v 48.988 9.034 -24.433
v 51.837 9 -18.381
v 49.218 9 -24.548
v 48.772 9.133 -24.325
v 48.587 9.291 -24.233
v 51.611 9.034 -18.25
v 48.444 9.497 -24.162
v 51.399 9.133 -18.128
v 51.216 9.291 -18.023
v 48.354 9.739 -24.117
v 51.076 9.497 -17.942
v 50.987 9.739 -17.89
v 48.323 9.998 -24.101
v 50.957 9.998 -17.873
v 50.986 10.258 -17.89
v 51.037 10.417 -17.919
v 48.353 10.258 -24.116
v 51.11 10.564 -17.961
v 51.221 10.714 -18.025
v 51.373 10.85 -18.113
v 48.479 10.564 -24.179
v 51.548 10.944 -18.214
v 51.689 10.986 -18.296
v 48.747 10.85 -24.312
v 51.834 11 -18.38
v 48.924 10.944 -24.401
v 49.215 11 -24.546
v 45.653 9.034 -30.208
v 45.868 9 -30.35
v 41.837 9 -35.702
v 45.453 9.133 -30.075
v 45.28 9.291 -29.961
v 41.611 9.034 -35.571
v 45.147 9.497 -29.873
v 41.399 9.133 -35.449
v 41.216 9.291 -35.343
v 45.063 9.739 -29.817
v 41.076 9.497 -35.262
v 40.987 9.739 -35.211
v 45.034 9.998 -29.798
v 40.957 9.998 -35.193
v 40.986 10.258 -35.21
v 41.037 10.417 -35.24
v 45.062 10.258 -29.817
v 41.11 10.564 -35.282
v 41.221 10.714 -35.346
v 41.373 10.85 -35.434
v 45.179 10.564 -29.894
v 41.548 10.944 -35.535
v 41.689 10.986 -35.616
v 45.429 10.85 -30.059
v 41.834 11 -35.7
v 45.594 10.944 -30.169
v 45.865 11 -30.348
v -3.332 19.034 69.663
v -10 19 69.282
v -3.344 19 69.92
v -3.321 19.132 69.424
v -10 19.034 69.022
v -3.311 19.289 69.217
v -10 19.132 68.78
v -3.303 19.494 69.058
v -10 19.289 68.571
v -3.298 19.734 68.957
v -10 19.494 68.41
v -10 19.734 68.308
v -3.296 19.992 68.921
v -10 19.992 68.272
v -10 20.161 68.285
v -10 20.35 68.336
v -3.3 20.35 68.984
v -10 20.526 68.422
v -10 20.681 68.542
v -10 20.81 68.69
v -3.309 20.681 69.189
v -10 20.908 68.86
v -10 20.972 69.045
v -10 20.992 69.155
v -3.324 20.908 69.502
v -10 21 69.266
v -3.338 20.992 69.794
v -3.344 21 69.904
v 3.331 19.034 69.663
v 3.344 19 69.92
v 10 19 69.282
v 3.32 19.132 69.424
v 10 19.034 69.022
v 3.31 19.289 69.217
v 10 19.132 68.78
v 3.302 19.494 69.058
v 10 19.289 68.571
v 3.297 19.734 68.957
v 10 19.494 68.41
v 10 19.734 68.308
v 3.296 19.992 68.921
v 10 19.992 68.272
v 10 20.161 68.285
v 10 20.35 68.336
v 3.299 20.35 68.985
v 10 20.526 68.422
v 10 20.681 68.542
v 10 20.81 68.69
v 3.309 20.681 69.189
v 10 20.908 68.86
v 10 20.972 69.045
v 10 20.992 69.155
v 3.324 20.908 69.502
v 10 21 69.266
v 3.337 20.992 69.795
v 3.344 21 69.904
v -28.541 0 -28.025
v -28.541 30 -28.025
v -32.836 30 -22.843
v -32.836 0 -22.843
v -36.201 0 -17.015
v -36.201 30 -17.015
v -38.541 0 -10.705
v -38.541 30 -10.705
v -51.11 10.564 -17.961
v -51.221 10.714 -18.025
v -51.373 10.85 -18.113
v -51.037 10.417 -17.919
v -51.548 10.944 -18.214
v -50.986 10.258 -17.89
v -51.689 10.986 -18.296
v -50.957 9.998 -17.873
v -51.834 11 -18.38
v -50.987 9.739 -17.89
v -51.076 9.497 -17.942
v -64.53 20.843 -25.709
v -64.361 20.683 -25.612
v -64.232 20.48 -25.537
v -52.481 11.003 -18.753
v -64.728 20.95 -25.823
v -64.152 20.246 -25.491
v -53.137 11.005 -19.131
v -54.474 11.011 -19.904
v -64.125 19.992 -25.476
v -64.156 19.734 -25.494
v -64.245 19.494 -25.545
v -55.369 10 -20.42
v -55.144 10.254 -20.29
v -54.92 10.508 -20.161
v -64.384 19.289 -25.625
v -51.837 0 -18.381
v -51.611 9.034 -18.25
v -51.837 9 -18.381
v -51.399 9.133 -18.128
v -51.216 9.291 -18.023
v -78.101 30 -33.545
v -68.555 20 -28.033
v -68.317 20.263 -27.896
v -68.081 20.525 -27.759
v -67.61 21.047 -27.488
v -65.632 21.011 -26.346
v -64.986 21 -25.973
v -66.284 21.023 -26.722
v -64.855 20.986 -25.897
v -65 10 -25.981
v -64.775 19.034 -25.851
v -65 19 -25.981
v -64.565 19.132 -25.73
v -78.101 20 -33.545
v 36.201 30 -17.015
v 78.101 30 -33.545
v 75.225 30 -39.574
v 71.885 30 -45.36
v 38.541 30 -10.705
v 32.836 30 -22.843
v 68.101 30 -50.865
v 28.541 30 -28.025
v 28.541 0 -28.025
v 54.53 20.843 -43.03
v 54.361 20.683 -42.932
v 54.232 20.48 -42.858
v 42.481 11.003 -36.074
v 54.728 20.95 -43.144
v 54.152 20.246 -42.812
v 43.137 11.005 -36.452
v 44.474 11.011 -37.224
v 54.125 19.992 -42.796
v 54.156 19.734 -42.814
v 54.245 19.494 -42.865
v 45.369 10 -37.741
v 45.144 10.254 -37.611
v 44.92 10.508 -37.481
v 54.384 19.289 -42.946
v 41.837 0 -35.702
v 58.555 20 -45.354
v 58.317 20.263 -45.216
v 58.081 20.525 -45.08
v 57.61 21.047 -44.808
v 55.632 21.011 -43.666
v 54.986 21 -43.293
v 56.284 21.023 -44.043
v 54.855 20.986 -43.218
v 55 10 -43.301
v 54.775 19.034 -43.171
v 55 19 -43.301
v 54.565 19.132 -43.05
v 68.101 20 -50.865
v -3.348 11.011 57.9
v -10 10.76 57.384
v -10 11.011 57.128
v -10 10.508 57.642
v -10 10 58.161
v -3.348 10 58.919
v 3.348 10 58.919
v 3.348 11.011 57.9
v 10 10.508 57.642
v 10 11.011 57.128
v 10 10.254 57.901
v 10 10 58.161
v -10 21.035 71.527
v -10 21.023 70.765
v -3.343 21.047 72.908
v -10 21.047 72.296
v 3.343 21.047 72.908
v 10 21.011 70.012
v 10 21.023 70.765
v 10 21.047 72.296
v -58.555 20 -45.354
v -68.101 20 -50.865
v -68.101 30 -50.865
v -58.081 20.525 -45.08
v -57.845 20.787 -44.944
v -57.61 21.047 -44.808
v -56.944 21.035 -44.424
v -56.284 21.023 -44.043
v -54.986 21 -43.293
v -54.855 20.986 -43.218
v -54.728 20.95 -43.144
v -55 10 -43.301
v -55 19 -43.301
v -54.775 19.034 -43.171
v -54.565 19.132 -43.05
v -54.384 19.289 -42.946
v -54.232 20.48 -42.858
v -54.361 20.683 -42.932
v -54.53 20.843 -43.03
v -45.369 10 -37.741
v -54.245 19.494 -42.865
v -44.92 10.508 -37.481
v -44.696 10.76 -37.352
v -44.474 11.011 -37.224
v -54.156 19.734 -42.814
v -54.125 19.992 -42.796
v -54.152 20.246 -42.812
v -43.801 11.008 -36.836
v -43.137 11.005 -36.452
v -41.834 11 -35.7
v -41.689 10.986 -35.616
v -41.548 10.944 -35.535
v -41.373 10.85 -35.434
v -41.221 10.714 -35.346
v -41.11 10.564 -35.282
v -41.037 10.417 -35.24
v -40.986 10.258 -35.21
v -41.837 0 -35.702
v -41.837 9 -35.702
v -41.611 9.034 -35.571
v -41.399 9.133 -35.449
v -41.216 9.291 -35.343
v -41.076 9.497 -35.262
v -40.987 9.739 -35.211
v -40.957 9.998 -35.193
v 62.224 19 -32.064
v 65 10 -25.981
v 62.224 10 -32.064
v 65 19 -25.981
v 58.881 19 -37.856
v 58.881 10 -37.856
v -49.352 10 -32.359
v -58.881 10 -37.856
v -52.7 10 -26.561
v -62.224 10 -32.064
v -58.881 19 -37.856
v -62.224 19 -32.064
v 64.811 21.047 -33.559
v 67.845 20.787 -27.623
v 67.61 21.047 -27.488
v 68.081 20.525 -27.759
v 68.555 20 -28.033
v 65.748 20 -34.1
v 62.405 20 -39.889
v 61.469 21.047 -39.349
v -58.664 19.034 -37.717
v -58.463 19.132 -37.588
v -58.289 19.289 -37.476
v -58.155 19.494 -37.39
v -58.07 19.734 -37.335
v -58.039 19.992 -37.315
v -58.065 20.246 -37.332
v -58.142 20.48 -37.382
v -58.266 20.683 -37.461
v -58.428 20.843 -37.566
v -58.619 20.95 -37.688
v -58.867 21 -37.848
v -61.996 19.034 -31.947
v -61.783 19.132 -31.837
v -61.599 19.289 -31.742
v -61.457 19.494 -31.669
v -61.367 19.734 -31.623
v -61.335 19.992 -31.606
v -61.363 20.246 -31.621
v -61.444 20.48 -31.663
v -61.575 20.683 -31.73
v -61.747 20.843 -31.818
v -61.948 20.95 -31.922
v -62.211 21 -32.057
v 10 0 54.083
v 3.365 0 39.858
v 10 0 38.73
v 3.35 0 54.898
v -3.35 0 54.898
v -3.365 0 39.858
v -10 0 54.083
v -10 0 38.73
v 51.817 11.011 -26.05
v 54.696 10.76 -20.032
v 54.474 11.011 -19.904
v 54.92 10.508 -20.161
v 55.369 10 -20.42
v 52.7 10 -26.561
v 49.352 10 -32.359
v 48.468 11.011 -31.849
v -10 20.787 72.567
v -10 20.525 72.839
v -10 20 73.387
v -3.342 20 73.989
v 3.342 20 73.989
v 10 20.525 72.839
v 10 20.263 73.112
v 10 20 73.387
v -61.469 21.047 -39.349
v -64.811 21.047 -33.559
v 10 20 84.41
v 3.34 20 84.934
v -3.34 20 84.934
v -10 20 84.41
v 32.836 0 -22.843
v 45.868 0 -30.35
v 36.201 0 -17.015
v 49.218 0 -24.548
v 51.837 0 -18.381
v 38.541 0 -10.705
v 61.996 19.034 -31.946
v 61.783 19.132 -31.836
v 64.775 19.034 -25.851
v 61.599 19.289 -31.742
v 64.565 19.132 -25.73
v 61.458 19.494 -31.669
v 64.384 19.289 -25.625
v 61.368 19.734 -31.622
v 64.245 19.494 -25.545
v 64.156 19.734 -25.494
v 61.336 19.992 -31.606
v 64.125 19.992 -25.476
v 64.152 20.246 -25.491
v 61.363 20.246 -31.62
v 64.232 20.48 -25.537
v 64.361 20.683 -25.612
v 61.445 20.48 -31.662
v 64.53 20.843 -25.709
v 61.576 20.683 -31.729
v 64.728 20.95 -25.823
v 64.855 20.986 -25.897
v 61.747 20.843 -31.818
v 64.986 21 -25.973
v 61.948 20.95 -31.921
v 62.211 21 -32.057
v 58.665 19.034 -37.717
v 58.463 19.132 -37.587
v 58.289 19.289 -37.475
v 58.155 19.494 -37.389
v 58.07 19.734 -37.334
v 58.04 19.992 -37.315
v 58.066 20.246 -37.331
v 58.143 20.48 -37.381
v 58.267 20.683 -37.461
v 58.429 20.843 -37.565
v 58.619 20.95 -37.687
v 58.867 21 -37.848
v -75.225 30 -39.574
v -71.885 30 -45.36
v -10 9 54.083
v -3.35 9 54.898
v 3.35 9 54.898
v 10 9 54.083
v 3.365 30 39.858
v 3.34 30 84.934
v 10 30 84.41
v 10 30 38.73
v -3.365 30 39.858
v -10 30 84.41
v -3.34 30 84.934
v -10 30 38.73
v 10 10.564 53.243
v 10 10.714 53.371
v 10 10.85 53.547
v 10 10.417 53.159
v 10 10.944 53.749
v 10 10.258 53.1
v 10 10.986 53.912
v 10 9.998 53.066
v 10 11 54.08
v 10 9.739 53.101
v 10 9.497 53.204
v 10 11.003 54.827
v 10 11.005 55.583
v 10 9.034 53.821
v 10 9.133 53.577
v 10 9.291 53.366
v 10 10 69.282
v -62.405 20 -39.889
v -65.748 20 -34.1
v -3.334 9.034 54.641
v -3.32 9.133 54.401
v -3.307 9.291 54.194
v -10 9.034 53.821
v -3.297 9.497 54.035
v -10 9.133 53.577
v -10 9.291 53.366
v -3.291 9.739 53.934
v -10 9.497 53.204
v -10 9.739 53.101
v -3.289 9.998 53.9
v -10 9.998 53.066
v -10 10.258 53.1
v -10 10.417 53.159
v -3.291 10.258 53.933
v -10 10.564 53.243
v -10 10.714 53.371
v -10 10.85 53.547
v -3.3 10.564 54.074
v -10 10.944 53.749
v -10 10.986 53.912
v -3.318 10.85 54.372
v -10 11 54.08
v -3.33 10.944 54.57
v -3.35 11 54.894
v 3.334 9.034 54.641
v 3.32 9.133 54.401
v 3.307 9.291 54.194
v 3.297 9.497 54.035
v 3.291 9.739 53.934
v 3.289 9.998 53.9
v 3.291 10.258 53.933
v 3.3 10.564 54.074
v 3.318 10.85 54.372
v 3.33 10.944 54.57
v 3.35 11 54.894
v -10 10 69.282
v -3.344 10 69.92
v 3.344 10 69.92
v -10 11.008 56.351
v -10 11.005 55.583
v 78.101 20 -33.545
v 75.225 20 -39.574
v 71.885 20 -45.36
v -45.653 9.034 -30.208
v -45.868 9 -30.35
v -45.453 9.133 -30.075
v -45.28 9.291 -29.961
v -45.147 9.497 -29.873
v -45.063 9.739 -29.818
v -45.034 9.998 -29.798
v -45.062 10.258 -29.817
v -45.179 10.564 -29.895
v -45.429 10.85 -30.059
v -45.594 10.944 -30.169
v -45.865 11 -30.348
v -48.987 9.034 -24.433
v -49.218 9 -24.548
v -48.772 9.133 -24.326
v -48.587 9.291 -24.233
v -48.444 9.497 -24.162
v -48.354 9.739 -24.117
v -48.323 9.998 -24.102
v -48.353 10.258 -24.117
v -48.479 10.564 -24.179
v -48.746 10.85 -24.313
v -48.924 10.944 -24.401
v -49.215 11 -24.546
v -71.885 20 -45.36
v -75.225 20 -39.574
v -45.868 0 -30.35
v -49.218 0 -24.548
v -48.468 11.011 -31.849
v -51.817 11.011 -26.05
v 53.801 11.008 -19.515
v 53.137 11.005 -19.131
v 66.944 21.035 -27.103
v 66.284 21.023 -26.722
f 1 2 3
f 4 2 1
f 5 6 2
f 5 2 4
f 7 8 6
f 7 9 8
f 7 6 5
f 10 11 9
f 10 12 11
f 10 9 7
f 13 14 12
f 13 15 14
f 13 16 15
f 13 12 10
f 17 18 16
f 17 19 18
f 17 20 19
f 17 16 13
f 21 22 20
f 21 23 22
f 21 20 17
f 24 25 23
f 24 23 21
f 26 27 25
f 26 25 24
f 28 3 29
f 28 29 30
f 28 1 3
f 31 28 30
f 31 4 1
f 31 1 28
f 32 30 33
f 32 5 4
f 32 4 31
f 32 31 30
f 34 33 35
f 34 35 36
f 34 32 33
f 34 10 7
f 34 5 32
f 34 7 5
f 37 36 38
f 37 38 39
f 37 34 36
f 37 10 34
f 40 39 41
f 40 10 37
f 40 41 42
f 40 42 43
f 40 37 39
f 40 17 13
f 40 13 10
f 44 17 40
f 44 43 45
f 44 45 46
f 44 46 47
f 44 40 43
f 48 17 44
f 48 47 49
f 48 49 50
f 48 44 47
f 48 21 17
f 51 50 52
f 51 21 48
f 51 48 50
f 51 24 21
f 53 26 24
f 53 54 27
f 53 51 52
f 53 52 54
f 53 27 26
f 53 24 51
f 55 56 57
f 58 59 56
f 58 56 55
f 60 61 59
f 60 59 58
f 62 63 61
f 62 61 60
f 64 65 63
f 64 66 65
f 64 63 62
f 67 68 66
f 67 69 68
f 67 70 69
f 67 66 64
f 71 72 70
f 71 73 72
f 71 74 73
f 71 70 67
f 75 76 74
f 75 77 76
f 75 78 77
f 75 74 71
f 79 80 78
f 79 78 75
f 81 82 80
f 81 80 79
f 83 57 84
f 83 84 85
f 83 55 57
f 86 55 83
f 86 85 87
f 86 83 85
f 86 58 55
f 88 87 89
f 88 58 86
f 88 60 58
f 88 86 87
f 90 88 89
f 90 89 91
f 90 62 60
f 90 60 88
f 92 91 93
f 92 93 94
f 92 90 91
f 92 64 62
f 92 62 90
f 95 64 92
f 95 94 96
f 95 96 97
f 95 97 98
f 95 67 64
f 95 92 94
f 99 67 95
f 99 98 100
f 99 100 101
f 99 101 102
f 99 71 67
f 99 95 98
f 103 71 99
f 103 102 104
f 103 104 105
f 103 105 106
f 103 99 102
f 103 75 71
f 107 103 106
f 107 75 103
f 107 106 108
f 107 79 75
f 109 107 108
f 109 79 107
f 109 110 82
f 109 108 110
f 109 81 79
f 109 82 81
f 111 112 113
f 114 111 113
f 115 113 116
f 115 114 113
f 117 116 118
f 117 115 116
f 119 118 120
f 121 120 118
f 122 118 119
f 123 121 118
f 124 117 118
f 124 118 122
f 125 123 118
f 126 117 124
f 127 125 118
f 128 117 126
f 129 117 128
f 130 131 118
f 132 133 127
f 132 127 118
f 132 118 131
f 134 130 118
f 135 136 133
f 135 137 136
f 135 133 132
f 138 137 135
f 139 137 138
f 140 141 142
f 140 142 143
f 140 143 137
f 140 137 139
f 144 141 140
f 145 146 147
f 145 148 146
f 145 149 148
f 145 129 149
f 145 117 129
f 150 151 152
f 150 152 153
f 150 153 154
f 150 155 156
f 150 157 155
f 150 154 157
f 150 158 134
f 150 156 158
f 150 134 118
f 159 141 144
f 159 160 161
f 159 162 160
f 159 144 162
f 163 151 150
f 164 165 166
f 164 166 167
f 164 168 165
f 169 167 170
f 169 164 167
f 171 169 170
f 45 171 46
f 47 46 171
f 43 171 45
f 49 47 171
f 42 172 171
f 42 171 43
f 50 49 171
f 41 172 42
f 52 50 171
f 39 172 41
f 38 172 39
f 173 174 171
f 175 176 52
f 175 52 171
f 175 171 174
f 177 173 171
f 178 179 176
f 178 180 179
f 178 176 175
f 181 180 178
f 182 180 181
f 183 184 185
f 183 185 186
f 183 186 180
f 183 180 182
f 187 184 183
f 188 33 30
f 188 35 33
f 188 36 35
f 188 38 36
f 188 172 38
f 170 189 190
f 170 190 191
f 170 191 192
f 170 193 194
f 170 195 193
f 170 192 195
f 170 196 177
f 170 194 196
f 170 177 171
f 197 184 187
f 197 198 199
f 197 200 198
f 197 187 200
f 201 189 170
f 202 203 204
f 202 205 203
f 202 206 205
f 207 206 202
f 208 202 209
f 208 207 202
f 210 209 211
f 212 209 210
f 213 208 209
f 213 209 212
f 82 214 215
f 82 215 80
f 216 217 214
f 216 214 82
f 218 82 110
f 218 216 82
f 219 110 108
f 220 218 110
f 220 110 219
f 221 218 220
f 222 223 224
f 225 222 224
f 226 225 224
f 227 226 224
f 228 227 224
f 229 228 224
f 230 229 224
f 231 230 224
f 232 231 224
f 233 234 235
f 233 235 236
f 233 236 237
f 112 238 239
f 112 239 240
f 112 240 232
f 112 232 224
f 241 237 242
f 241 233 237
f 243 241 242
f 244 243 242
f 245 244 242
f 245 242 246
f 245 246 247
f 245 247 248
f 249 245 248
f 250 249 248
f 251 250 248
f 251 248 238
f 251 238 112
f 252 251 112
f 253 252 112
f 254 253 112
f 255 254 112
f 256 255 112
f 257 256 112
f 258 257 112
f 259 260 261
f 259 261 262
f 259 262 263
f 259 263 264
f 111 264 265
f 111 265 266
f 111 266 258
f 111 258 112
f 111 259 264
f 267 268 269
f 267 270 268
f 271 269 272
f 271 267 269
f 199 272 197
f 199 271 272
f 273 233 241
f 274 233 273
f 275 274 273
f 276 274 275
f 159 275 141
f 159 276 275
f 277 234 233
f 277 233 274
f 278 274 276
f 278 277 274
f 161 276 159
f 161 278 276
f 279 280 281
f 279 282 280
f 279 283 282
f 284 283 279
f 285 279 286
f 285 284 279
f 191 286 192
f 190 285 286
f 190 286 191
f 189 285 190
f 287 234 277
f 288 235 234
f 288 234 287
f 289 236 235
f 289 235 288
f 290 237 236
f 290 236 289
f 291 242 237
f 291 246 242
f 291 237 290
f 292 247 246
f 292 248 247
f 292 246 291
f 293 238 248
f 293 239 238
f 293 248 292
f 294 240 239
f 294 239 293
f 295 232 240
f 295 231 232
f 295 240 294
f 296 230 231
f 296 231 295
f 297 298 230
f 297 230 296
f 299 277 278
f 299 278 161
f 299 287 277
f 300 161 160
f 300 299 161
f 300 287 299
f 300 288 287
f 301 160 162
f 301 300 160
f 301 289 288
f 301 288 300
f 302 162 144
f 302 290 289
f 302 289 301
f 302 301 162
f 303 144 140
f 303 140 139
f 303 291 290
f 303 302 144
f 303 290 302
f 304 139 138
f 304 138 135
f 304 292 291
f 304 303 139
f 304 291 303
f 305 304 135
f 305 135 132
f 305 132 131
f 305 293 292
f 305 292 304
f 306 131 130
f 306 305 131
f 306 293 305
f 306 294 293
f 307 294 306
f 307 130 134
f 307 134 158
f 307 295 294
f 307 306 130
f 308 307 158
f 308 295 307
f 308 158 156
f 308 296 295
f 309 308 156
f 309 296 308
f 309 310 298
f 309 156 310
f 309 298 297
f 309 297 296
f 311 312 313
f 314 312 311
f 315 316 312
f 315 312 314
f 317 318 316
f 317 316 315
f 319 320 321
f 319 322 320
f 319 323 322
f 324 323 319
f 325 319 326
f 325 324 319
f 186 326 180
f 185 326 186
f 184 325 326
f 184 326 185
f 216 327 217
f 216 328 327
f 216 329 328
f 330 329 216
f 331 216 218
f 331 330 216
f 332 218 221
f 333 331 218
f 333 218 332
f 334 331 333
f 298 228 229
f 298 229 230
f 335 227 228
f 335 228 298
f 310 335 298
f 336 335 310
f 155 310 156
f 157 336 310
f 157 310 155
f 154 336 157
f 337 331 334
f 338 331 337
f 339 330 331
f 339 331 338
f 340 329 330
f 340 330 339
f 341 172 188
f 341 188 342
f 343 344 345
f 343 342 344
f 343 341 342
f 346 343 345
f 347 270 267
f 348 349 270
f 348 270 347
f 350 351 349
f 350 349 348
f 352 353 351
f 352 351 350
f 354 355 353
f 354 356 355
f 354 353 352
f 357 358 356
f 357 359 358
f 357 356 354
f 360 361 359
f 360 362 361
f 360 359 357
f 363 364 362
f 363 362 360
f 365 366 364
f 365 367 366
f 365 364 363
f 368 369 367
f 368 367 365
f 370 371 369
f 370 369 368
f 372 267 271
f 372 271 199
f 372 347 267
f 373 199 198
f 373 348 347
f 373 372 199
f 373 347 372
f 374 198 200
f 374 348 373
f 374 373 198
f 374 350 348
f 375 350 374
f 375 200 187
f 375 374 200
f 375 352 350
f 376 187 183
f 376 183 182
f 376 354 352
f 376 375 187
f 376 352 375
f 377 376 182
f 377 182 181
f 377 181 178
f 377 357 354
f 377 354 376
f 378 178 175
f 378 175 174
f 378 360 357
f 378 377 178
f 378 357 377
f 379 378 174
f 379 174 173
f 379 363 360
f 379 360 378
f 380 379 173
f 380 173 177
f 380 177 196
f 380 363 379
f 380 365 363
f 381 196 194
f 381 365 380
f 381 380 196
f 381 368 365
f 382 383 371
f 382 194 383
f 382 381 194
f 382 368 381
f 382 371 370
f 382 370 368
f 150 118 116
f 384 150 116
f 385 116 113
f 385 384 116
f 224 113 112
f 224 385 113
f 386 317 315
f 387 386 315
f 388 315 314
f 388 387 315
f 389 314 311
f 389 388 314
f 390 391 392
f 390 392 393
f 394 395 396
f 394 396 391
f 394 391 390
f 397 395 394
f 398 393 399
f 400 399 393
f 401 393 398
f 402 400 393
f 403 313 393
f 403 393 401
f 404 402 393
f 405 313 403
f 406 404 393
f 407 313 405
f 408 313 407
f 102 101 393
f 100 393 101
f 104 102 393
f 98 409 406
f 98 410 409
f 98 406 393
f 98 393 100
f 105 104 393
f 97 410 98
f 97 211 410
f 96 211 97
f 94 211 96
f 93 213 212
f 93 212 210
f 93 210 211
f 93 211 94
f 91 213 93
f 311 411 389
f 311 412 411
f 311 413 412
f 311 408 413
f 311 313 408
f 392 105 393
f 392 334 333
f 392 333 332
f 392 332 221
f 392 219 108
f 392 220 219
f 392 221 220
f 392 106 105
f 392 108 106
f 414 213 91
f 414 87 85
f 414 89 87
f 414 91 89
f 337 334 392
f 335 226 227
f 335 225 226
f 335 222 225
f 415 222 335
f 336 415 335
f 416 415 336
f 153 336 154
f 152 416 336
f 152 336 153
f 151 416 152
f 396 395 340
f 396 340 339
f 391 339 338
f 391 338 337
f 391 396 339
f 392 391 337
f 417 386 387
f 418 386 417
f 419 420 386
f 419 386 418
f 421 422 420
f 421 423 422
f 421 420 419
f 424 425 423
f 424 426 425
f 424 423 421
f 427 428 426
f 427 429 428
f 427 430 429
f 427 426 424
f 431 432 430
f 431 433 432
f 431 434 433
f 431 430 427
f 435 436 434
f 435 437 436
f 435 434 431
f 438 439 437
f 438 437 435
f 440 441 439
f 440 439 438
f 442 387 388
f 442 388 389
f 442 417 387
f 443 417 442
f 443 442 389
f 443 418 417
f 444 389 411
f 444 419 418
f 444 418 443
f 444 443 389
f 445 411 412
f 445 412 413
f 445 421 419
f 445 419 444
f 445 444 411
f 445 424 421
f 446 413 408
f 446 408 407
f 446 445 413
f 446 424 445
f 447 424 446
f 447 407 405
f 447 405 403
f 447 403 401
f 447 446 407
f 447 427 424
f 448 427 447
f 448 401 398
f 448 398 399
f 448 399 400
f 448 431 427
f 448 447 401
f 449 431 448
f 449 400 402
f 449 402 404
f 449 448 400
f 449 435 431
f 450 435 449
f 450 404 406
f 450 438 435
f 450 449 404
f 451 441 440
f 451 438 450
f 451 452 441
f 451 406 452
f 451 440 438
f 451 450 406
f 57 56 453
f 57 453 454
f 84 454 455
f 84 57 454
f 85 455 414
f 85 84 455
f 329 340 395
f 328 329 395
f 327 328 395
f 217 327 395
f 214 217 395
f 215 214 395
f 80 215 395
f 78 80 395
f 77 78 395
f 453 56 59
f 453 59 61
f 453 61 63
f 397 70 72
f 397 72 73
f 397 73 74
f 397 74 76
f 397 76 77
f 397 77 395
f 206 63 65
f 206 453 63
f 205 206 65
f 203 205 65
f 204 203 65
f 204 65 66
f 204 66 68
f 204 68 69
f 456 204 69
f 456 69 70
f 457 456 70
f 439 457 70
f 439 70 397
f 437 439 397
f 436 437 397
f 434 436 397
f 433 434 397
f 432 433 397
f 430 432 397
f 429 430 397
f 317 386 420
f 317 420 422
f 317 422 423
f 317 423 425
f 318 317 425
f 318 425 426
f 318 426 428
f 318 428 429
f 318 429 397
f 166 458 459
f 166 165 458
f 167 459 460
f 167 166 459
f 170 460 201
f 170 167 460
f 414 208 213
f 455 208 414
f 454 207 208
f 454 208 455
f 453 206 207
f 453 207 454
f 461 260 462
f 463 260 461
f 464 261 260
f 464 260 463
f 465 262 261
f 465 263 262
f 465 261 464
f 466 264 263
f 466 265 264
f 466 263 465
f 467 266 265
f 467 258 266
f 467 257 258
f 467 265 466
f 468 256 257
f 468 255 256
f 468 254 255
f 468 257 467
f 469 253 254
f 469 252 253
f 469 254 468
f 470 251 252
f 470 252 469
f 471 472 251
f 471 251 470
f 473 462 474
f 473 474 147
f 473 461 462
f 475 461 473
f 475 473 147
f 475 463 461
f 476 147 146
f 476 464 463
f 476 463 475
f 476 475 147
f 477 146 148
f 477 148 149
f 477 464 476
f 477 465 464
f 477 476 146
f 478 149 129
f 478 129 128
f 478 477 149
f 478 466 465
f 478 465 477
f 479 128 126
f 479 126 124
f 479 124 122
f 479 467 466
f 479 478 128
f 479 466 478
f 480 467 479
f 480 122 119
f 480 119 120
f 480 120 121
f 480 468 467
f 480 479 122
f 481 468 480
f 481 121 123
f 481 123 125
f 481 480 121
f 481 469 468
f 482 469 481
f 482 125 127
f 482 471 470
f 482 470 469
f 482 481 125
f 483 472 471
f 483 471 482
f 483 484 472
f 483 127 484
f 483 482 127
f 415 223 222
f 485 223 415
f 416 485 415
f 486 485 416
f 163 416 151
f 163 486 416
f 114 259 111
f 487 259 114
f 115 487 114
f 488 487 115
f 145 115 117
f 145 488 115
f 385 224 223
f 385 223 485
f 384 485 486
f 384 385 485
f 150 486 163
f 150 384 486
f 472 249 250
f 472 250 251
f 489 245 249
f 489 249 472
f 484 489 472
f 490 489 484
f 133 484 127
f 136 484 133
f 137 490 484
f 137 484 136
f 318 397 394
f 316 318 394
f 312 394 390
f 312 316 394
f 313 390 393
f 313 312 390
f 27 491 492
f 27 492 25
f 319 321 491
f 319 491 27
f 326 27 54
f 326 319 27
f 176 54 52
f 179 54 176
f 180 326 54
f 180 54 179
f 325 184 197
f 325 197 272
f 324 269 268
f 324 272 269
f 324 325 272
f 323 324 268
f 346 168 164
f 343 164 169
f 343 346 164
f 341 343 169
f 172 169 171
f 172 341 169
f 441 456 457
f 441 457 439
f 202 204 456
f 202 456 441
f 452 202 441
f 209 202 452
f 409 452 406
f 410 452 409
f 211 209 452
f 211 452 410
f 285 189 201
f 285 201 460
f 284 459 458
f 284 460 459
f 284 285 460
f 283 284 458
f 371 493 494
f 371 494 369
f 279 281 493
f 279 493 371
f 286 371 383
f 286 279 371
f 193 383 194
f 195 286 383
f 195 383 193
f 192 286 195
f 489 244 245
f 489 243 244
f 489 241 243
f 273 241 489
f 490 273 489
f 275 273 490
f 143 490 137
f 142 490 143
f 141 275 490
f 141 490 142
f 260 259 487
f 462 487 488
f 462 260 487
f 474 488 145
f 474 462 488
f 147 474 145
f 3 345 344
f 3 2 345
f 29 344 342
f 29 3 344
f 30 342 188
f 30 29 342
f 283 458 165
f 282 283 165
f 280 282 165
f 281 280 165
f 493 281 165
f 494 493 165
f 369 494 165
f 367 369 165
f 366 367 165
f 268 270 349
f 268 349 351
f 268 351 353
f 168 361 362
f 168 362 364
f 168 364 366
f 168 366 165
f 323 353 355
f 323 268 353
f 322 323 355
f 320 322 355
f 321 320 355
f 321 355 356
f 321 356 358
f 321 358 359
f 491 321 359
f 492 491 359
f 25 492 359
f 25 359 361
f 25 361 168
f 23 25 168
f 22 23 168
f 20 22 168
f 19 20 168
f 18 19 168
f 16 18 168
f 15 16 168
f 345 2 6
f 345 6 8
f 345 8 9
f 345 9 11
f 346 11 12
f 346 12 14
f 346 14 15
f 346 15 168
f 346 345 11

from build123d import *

# Parameters (mm, degrees)
SKETCH2_OUTSIDE_W  = 220.456
SKETCH2_OUTSIDE_H  = 220.456
CUT_EXTRUDE2_DEPTH = 124.895116934


with BuildPart() as part:
    # Sketch1 → Revolve1 (revolve)
    with BuildSketch(Plane.XY, mode=Mode.PRIVATE) as revolve1_sk:
        with BuildLine():
            Line((55, 0), (55, 9))
            ThreePointArc((55, 9), (54.000001606, 9.998208058), (54.996416123, 10.999993578))
            Line((54.996416123, 10.999993578), (57.996416123, 11.010745279))
            Line((57.996416123, 11.010745279), (59.01443228, 10))
            Line((59.01443228, 10), (70, 10))
            Line((70, 10), (70, 19))
            ThreePointArc((70, 19), (69.000030851, 19.992145002), (69.984290489, 20.999876598))
            Line((69.984290489, 20.999876598), (72.984290489, 21.047010949))
            Line((72.984290489, 21.047010949), (74.064726717, 20))
            Line((74.064726717, 20), (85, 20))
            Line((85, 20), (85, 30))
            Line((85, 30), (40, 30))
            Line((40, 30), (40, 0))
            Line((40, 0), (55, 0))
        make_face()
    revolve(revolve1_sk.sketch.rotate(Axis((0, 0, 0), (0, 1, 0)), 90), axis=Axis((0, 0, 0), (0, 1, 0)))

    # Sketch2 outside → Cut-Extrude2 (cut, through all)
    with BuildSketch(Plane(origin=(0, 0, 0), x_dir=(1, 0, 0), z_dir=(0, 1, 0))):
        Rectangle(SKETCH2_OUTSIDE_W, SKETCH2_OUTSIDE_H)
        Polygon((-81.602540378, 58.660254038), (0, 11.547005384), (81.602540378, 58.660254038), (91.602540378, 41.339745962), (10, -5.773502692), (10, -100), (-10, -100), (-10, -5.773502692), (-91.602540378, 41.339745962), align=None, mode=Mode.SUBTRACT)
    extrude(amount=CUT_EXTRUDE2_DEPTH, mode=Mode.SUBTRACT)


with BuildPart() as cut_extrude2_piece_1:
    # of the separate pieces the step leaves, piece 1, a body of its own (cut_extrude2_pieces)
    add(part.part.solids().sort_by_distance((-10, 0, 54.083269132))[0])


with BuildPart() as cut_extrude2_piece_2:
    # of the separate pieces the step leaves, piece 2, a body of its own (cut_extrude2_pieces)
    add(part.part.solids().sort_by_distance((51.837484988, 0, -18.381380528))[0])


with BuildPart() as cut_extrude2_piece_3:
    # of the separate pieces the step leaves, piece 3, a body of its own (cut_extrude2_pieces)
    add(part.part.solids().sort_by_distance((-41.837484988, 0, -35.701888604))[0])


solid = Compound([cut_extrude2_piece_1.part, cut_extrude2_piece_2.part, cut_extrude2_piece_3.part])
